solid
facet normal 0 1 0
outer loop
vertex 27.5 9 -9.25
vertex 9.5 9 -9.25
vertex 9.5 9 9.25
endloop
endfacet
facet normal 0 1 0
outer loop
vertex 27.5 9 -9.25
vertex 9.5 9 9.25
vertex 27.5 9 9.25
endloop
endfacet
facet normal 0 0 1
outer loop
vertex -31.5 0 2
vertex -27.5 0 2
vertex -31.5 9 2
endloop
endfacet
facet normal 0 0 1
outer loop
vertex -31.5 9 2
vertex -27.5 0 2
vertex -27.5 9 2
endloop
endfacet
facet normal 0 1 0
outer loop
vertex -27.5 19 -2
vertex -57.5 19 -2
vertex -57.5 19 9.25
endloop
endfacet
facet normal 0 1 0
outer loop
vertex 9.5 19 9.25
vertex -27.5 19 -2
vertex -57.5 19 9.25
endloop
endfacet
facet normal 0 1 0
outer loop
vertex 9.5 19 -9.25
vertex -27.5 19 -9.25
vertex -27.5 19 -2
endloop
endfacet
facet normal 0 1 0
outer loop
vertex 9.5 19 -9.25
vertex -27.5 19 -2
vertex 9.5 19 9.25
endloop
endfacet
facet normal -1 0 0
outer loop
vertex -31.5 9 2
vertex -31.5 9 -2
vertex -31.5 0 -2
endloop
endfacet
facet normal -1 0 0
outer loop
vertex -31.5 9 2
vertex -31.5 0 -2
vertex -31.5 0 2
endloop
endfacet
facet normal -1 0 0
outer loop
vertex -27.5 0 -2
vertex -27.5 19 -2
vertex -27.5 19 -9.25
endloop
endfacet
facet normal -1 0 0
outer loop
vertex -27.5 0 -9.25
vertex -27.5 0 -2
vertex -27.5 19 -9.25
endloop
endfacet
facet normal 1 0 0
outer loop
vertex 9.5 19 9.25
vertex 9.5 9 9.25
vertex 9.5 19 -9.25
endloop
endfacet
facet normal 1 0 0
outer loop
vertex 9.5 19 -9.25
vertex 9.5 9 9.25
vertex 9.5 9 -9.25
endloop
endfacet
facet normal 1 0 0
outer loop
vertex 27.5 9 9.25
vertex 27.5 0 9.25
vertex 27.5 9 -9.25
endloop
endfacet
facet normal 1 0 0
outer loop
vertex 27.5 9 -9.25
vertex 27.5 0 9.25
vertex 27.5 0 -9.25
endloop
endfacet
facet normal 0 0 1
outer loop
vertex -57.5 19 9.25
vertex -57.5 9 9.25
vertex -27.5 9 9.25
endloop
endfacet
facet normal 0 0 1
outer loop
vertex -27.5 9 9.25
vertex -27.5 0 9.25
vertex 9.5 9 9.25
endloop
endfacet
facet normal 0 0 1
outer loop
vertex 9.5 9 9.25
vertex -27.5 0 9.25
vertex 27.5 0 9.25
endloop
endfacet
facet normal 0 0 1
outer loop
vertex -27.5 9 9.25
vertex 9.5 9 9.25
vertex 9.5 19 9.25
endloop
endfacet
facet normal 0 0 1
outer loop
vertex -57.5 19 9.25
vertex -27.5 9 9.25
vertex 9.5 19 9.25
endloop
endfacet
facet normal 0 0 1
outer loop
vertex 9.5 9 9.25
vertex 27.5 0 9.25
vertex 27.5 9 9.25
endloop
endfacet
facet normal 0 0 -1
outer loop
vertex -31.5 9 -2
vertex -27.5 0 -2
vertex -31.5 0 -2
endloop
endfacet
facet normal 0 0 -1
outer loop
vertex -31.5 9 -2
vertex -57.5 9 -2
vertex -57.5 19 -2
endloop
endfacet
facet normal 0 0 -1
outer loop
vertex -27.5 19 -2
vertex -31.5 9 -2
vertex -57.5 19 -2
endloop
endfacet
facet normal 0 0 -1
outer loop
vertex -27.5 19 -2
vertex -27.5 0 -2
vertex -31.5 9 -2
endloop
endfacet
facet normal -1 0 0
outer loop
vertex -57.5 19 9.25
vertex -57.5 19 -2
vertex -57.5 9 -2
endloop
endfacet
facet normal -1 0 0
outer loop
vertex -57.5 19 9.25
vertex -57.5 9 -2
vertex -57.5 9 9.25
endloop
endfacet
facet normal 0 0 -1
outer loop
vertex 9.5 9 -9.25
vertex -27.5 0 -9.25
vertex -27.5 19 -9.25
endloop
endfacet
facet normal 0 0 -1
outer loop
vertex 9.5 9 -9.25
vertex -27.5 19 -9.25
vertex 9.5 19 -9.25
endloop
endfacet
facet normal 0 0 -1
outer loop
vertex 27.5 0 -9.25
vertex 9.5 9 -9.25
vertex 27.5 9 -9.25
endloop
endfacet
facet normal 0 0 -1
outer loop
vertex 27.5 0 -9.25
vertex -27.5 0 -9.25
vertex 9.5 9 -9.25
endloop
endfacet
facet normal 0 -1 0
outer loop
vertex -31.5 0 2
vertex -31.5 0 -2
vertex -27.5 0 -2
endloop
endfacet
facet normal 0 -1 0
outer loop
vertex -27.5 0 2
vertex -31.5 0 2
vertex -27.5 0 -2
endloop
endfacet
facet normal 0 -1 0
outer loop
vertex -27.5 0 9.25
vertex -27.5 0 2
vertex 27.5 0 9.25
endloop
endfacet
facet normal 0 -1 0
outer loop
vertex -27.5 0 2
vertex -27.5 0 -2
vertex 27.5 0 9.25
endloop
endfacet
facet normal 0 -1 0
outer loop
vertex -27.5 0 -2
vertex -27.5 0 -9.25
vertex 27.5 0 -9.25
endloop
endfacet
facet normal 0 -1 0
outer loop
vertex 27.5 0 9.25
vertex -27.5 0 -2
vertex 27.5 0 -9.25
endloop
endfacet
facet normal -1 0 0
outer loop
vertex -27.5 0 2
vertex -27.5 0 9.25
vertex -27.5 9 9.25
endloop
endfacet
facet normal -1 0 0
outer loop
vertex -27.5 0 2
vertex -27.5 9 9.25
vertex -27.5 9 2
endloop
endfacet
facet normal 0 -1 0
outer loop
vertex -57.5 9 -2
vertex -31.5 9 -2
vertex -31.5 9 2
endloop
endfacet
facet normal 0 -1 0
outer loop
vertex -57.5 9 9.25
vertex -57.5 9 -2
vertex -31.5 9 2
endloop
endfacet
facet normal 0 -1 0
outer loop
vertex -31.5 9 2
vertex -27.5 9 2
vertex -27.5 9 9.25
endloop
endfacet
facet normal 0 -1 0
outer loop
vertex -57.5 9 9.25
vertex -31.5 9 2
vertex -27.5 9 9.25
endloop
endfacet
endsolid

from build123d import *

# Parameters (mm, degrees)
SKETCH1_W           = 55
SKETCH1_H           = 18.5
BOSS_EXTRUDE1_DEPTH = 9
SKETCH2_W           = 37
SKETCH2_H           = 18.5
BOSS_EXTRUDE2_DEPTH = 10
SKETCH3_W           = 4
SKETCH3_H           = 19
BOSS_EXTRUDE3_DEPTH = 4
SKETCH4_W           = 11.25
SKETCH4_H           = 10
BOSS_EXTRUDE4_DEPTH = 30


with BuildPart() as part:
    # Sketch1 → Boss-Extrude1 (new body)
    with BuildSketch(Plane(origin=(0, 0, 0), x_dir=(1, 0, 0), z_dir=(0, 1, 0))):
        Rectangle(SKETCH1_W, SKETCH1_H)
    extrude(amount=BOSS_EXTRUDE1_DEPTH)

    # Sketch2 → Boss-Extrude2 (add)
    with BuildSketch(Plane(origin=(0, 9, 0), x_dir=(1, 0, 0), z_dir=(0, 1, 0))):
        with Locations((-9, 0)):
            Rectangle(SKETCH2_W, SKETCH2_H)
    extrude(amount=BOSS_EXTRUDE2_DEPTH)

    # Sketch3 → Boss-Extrude3 (add)
    with BuildSketch(Plane.ZY.offset(27.5)):
        with Locations((0, 9.5)):
            Rectangle(SKETCH3_W, SKETCH3_H)
    extrude(amount=BOSS_EXTRUDE3_DEPTH)

    # Sketch4 → Boss-Extrude4 (add)
    with BuildSketch(Plane.ZY.offset(27.5)):
        with Locations((3.625, 14)):
            Rectangle(SKETCH4_W, SKETCH4_H)
    extrude(amount=BOSS_EXTRUDE4_DEPTH)


solid = part.part
